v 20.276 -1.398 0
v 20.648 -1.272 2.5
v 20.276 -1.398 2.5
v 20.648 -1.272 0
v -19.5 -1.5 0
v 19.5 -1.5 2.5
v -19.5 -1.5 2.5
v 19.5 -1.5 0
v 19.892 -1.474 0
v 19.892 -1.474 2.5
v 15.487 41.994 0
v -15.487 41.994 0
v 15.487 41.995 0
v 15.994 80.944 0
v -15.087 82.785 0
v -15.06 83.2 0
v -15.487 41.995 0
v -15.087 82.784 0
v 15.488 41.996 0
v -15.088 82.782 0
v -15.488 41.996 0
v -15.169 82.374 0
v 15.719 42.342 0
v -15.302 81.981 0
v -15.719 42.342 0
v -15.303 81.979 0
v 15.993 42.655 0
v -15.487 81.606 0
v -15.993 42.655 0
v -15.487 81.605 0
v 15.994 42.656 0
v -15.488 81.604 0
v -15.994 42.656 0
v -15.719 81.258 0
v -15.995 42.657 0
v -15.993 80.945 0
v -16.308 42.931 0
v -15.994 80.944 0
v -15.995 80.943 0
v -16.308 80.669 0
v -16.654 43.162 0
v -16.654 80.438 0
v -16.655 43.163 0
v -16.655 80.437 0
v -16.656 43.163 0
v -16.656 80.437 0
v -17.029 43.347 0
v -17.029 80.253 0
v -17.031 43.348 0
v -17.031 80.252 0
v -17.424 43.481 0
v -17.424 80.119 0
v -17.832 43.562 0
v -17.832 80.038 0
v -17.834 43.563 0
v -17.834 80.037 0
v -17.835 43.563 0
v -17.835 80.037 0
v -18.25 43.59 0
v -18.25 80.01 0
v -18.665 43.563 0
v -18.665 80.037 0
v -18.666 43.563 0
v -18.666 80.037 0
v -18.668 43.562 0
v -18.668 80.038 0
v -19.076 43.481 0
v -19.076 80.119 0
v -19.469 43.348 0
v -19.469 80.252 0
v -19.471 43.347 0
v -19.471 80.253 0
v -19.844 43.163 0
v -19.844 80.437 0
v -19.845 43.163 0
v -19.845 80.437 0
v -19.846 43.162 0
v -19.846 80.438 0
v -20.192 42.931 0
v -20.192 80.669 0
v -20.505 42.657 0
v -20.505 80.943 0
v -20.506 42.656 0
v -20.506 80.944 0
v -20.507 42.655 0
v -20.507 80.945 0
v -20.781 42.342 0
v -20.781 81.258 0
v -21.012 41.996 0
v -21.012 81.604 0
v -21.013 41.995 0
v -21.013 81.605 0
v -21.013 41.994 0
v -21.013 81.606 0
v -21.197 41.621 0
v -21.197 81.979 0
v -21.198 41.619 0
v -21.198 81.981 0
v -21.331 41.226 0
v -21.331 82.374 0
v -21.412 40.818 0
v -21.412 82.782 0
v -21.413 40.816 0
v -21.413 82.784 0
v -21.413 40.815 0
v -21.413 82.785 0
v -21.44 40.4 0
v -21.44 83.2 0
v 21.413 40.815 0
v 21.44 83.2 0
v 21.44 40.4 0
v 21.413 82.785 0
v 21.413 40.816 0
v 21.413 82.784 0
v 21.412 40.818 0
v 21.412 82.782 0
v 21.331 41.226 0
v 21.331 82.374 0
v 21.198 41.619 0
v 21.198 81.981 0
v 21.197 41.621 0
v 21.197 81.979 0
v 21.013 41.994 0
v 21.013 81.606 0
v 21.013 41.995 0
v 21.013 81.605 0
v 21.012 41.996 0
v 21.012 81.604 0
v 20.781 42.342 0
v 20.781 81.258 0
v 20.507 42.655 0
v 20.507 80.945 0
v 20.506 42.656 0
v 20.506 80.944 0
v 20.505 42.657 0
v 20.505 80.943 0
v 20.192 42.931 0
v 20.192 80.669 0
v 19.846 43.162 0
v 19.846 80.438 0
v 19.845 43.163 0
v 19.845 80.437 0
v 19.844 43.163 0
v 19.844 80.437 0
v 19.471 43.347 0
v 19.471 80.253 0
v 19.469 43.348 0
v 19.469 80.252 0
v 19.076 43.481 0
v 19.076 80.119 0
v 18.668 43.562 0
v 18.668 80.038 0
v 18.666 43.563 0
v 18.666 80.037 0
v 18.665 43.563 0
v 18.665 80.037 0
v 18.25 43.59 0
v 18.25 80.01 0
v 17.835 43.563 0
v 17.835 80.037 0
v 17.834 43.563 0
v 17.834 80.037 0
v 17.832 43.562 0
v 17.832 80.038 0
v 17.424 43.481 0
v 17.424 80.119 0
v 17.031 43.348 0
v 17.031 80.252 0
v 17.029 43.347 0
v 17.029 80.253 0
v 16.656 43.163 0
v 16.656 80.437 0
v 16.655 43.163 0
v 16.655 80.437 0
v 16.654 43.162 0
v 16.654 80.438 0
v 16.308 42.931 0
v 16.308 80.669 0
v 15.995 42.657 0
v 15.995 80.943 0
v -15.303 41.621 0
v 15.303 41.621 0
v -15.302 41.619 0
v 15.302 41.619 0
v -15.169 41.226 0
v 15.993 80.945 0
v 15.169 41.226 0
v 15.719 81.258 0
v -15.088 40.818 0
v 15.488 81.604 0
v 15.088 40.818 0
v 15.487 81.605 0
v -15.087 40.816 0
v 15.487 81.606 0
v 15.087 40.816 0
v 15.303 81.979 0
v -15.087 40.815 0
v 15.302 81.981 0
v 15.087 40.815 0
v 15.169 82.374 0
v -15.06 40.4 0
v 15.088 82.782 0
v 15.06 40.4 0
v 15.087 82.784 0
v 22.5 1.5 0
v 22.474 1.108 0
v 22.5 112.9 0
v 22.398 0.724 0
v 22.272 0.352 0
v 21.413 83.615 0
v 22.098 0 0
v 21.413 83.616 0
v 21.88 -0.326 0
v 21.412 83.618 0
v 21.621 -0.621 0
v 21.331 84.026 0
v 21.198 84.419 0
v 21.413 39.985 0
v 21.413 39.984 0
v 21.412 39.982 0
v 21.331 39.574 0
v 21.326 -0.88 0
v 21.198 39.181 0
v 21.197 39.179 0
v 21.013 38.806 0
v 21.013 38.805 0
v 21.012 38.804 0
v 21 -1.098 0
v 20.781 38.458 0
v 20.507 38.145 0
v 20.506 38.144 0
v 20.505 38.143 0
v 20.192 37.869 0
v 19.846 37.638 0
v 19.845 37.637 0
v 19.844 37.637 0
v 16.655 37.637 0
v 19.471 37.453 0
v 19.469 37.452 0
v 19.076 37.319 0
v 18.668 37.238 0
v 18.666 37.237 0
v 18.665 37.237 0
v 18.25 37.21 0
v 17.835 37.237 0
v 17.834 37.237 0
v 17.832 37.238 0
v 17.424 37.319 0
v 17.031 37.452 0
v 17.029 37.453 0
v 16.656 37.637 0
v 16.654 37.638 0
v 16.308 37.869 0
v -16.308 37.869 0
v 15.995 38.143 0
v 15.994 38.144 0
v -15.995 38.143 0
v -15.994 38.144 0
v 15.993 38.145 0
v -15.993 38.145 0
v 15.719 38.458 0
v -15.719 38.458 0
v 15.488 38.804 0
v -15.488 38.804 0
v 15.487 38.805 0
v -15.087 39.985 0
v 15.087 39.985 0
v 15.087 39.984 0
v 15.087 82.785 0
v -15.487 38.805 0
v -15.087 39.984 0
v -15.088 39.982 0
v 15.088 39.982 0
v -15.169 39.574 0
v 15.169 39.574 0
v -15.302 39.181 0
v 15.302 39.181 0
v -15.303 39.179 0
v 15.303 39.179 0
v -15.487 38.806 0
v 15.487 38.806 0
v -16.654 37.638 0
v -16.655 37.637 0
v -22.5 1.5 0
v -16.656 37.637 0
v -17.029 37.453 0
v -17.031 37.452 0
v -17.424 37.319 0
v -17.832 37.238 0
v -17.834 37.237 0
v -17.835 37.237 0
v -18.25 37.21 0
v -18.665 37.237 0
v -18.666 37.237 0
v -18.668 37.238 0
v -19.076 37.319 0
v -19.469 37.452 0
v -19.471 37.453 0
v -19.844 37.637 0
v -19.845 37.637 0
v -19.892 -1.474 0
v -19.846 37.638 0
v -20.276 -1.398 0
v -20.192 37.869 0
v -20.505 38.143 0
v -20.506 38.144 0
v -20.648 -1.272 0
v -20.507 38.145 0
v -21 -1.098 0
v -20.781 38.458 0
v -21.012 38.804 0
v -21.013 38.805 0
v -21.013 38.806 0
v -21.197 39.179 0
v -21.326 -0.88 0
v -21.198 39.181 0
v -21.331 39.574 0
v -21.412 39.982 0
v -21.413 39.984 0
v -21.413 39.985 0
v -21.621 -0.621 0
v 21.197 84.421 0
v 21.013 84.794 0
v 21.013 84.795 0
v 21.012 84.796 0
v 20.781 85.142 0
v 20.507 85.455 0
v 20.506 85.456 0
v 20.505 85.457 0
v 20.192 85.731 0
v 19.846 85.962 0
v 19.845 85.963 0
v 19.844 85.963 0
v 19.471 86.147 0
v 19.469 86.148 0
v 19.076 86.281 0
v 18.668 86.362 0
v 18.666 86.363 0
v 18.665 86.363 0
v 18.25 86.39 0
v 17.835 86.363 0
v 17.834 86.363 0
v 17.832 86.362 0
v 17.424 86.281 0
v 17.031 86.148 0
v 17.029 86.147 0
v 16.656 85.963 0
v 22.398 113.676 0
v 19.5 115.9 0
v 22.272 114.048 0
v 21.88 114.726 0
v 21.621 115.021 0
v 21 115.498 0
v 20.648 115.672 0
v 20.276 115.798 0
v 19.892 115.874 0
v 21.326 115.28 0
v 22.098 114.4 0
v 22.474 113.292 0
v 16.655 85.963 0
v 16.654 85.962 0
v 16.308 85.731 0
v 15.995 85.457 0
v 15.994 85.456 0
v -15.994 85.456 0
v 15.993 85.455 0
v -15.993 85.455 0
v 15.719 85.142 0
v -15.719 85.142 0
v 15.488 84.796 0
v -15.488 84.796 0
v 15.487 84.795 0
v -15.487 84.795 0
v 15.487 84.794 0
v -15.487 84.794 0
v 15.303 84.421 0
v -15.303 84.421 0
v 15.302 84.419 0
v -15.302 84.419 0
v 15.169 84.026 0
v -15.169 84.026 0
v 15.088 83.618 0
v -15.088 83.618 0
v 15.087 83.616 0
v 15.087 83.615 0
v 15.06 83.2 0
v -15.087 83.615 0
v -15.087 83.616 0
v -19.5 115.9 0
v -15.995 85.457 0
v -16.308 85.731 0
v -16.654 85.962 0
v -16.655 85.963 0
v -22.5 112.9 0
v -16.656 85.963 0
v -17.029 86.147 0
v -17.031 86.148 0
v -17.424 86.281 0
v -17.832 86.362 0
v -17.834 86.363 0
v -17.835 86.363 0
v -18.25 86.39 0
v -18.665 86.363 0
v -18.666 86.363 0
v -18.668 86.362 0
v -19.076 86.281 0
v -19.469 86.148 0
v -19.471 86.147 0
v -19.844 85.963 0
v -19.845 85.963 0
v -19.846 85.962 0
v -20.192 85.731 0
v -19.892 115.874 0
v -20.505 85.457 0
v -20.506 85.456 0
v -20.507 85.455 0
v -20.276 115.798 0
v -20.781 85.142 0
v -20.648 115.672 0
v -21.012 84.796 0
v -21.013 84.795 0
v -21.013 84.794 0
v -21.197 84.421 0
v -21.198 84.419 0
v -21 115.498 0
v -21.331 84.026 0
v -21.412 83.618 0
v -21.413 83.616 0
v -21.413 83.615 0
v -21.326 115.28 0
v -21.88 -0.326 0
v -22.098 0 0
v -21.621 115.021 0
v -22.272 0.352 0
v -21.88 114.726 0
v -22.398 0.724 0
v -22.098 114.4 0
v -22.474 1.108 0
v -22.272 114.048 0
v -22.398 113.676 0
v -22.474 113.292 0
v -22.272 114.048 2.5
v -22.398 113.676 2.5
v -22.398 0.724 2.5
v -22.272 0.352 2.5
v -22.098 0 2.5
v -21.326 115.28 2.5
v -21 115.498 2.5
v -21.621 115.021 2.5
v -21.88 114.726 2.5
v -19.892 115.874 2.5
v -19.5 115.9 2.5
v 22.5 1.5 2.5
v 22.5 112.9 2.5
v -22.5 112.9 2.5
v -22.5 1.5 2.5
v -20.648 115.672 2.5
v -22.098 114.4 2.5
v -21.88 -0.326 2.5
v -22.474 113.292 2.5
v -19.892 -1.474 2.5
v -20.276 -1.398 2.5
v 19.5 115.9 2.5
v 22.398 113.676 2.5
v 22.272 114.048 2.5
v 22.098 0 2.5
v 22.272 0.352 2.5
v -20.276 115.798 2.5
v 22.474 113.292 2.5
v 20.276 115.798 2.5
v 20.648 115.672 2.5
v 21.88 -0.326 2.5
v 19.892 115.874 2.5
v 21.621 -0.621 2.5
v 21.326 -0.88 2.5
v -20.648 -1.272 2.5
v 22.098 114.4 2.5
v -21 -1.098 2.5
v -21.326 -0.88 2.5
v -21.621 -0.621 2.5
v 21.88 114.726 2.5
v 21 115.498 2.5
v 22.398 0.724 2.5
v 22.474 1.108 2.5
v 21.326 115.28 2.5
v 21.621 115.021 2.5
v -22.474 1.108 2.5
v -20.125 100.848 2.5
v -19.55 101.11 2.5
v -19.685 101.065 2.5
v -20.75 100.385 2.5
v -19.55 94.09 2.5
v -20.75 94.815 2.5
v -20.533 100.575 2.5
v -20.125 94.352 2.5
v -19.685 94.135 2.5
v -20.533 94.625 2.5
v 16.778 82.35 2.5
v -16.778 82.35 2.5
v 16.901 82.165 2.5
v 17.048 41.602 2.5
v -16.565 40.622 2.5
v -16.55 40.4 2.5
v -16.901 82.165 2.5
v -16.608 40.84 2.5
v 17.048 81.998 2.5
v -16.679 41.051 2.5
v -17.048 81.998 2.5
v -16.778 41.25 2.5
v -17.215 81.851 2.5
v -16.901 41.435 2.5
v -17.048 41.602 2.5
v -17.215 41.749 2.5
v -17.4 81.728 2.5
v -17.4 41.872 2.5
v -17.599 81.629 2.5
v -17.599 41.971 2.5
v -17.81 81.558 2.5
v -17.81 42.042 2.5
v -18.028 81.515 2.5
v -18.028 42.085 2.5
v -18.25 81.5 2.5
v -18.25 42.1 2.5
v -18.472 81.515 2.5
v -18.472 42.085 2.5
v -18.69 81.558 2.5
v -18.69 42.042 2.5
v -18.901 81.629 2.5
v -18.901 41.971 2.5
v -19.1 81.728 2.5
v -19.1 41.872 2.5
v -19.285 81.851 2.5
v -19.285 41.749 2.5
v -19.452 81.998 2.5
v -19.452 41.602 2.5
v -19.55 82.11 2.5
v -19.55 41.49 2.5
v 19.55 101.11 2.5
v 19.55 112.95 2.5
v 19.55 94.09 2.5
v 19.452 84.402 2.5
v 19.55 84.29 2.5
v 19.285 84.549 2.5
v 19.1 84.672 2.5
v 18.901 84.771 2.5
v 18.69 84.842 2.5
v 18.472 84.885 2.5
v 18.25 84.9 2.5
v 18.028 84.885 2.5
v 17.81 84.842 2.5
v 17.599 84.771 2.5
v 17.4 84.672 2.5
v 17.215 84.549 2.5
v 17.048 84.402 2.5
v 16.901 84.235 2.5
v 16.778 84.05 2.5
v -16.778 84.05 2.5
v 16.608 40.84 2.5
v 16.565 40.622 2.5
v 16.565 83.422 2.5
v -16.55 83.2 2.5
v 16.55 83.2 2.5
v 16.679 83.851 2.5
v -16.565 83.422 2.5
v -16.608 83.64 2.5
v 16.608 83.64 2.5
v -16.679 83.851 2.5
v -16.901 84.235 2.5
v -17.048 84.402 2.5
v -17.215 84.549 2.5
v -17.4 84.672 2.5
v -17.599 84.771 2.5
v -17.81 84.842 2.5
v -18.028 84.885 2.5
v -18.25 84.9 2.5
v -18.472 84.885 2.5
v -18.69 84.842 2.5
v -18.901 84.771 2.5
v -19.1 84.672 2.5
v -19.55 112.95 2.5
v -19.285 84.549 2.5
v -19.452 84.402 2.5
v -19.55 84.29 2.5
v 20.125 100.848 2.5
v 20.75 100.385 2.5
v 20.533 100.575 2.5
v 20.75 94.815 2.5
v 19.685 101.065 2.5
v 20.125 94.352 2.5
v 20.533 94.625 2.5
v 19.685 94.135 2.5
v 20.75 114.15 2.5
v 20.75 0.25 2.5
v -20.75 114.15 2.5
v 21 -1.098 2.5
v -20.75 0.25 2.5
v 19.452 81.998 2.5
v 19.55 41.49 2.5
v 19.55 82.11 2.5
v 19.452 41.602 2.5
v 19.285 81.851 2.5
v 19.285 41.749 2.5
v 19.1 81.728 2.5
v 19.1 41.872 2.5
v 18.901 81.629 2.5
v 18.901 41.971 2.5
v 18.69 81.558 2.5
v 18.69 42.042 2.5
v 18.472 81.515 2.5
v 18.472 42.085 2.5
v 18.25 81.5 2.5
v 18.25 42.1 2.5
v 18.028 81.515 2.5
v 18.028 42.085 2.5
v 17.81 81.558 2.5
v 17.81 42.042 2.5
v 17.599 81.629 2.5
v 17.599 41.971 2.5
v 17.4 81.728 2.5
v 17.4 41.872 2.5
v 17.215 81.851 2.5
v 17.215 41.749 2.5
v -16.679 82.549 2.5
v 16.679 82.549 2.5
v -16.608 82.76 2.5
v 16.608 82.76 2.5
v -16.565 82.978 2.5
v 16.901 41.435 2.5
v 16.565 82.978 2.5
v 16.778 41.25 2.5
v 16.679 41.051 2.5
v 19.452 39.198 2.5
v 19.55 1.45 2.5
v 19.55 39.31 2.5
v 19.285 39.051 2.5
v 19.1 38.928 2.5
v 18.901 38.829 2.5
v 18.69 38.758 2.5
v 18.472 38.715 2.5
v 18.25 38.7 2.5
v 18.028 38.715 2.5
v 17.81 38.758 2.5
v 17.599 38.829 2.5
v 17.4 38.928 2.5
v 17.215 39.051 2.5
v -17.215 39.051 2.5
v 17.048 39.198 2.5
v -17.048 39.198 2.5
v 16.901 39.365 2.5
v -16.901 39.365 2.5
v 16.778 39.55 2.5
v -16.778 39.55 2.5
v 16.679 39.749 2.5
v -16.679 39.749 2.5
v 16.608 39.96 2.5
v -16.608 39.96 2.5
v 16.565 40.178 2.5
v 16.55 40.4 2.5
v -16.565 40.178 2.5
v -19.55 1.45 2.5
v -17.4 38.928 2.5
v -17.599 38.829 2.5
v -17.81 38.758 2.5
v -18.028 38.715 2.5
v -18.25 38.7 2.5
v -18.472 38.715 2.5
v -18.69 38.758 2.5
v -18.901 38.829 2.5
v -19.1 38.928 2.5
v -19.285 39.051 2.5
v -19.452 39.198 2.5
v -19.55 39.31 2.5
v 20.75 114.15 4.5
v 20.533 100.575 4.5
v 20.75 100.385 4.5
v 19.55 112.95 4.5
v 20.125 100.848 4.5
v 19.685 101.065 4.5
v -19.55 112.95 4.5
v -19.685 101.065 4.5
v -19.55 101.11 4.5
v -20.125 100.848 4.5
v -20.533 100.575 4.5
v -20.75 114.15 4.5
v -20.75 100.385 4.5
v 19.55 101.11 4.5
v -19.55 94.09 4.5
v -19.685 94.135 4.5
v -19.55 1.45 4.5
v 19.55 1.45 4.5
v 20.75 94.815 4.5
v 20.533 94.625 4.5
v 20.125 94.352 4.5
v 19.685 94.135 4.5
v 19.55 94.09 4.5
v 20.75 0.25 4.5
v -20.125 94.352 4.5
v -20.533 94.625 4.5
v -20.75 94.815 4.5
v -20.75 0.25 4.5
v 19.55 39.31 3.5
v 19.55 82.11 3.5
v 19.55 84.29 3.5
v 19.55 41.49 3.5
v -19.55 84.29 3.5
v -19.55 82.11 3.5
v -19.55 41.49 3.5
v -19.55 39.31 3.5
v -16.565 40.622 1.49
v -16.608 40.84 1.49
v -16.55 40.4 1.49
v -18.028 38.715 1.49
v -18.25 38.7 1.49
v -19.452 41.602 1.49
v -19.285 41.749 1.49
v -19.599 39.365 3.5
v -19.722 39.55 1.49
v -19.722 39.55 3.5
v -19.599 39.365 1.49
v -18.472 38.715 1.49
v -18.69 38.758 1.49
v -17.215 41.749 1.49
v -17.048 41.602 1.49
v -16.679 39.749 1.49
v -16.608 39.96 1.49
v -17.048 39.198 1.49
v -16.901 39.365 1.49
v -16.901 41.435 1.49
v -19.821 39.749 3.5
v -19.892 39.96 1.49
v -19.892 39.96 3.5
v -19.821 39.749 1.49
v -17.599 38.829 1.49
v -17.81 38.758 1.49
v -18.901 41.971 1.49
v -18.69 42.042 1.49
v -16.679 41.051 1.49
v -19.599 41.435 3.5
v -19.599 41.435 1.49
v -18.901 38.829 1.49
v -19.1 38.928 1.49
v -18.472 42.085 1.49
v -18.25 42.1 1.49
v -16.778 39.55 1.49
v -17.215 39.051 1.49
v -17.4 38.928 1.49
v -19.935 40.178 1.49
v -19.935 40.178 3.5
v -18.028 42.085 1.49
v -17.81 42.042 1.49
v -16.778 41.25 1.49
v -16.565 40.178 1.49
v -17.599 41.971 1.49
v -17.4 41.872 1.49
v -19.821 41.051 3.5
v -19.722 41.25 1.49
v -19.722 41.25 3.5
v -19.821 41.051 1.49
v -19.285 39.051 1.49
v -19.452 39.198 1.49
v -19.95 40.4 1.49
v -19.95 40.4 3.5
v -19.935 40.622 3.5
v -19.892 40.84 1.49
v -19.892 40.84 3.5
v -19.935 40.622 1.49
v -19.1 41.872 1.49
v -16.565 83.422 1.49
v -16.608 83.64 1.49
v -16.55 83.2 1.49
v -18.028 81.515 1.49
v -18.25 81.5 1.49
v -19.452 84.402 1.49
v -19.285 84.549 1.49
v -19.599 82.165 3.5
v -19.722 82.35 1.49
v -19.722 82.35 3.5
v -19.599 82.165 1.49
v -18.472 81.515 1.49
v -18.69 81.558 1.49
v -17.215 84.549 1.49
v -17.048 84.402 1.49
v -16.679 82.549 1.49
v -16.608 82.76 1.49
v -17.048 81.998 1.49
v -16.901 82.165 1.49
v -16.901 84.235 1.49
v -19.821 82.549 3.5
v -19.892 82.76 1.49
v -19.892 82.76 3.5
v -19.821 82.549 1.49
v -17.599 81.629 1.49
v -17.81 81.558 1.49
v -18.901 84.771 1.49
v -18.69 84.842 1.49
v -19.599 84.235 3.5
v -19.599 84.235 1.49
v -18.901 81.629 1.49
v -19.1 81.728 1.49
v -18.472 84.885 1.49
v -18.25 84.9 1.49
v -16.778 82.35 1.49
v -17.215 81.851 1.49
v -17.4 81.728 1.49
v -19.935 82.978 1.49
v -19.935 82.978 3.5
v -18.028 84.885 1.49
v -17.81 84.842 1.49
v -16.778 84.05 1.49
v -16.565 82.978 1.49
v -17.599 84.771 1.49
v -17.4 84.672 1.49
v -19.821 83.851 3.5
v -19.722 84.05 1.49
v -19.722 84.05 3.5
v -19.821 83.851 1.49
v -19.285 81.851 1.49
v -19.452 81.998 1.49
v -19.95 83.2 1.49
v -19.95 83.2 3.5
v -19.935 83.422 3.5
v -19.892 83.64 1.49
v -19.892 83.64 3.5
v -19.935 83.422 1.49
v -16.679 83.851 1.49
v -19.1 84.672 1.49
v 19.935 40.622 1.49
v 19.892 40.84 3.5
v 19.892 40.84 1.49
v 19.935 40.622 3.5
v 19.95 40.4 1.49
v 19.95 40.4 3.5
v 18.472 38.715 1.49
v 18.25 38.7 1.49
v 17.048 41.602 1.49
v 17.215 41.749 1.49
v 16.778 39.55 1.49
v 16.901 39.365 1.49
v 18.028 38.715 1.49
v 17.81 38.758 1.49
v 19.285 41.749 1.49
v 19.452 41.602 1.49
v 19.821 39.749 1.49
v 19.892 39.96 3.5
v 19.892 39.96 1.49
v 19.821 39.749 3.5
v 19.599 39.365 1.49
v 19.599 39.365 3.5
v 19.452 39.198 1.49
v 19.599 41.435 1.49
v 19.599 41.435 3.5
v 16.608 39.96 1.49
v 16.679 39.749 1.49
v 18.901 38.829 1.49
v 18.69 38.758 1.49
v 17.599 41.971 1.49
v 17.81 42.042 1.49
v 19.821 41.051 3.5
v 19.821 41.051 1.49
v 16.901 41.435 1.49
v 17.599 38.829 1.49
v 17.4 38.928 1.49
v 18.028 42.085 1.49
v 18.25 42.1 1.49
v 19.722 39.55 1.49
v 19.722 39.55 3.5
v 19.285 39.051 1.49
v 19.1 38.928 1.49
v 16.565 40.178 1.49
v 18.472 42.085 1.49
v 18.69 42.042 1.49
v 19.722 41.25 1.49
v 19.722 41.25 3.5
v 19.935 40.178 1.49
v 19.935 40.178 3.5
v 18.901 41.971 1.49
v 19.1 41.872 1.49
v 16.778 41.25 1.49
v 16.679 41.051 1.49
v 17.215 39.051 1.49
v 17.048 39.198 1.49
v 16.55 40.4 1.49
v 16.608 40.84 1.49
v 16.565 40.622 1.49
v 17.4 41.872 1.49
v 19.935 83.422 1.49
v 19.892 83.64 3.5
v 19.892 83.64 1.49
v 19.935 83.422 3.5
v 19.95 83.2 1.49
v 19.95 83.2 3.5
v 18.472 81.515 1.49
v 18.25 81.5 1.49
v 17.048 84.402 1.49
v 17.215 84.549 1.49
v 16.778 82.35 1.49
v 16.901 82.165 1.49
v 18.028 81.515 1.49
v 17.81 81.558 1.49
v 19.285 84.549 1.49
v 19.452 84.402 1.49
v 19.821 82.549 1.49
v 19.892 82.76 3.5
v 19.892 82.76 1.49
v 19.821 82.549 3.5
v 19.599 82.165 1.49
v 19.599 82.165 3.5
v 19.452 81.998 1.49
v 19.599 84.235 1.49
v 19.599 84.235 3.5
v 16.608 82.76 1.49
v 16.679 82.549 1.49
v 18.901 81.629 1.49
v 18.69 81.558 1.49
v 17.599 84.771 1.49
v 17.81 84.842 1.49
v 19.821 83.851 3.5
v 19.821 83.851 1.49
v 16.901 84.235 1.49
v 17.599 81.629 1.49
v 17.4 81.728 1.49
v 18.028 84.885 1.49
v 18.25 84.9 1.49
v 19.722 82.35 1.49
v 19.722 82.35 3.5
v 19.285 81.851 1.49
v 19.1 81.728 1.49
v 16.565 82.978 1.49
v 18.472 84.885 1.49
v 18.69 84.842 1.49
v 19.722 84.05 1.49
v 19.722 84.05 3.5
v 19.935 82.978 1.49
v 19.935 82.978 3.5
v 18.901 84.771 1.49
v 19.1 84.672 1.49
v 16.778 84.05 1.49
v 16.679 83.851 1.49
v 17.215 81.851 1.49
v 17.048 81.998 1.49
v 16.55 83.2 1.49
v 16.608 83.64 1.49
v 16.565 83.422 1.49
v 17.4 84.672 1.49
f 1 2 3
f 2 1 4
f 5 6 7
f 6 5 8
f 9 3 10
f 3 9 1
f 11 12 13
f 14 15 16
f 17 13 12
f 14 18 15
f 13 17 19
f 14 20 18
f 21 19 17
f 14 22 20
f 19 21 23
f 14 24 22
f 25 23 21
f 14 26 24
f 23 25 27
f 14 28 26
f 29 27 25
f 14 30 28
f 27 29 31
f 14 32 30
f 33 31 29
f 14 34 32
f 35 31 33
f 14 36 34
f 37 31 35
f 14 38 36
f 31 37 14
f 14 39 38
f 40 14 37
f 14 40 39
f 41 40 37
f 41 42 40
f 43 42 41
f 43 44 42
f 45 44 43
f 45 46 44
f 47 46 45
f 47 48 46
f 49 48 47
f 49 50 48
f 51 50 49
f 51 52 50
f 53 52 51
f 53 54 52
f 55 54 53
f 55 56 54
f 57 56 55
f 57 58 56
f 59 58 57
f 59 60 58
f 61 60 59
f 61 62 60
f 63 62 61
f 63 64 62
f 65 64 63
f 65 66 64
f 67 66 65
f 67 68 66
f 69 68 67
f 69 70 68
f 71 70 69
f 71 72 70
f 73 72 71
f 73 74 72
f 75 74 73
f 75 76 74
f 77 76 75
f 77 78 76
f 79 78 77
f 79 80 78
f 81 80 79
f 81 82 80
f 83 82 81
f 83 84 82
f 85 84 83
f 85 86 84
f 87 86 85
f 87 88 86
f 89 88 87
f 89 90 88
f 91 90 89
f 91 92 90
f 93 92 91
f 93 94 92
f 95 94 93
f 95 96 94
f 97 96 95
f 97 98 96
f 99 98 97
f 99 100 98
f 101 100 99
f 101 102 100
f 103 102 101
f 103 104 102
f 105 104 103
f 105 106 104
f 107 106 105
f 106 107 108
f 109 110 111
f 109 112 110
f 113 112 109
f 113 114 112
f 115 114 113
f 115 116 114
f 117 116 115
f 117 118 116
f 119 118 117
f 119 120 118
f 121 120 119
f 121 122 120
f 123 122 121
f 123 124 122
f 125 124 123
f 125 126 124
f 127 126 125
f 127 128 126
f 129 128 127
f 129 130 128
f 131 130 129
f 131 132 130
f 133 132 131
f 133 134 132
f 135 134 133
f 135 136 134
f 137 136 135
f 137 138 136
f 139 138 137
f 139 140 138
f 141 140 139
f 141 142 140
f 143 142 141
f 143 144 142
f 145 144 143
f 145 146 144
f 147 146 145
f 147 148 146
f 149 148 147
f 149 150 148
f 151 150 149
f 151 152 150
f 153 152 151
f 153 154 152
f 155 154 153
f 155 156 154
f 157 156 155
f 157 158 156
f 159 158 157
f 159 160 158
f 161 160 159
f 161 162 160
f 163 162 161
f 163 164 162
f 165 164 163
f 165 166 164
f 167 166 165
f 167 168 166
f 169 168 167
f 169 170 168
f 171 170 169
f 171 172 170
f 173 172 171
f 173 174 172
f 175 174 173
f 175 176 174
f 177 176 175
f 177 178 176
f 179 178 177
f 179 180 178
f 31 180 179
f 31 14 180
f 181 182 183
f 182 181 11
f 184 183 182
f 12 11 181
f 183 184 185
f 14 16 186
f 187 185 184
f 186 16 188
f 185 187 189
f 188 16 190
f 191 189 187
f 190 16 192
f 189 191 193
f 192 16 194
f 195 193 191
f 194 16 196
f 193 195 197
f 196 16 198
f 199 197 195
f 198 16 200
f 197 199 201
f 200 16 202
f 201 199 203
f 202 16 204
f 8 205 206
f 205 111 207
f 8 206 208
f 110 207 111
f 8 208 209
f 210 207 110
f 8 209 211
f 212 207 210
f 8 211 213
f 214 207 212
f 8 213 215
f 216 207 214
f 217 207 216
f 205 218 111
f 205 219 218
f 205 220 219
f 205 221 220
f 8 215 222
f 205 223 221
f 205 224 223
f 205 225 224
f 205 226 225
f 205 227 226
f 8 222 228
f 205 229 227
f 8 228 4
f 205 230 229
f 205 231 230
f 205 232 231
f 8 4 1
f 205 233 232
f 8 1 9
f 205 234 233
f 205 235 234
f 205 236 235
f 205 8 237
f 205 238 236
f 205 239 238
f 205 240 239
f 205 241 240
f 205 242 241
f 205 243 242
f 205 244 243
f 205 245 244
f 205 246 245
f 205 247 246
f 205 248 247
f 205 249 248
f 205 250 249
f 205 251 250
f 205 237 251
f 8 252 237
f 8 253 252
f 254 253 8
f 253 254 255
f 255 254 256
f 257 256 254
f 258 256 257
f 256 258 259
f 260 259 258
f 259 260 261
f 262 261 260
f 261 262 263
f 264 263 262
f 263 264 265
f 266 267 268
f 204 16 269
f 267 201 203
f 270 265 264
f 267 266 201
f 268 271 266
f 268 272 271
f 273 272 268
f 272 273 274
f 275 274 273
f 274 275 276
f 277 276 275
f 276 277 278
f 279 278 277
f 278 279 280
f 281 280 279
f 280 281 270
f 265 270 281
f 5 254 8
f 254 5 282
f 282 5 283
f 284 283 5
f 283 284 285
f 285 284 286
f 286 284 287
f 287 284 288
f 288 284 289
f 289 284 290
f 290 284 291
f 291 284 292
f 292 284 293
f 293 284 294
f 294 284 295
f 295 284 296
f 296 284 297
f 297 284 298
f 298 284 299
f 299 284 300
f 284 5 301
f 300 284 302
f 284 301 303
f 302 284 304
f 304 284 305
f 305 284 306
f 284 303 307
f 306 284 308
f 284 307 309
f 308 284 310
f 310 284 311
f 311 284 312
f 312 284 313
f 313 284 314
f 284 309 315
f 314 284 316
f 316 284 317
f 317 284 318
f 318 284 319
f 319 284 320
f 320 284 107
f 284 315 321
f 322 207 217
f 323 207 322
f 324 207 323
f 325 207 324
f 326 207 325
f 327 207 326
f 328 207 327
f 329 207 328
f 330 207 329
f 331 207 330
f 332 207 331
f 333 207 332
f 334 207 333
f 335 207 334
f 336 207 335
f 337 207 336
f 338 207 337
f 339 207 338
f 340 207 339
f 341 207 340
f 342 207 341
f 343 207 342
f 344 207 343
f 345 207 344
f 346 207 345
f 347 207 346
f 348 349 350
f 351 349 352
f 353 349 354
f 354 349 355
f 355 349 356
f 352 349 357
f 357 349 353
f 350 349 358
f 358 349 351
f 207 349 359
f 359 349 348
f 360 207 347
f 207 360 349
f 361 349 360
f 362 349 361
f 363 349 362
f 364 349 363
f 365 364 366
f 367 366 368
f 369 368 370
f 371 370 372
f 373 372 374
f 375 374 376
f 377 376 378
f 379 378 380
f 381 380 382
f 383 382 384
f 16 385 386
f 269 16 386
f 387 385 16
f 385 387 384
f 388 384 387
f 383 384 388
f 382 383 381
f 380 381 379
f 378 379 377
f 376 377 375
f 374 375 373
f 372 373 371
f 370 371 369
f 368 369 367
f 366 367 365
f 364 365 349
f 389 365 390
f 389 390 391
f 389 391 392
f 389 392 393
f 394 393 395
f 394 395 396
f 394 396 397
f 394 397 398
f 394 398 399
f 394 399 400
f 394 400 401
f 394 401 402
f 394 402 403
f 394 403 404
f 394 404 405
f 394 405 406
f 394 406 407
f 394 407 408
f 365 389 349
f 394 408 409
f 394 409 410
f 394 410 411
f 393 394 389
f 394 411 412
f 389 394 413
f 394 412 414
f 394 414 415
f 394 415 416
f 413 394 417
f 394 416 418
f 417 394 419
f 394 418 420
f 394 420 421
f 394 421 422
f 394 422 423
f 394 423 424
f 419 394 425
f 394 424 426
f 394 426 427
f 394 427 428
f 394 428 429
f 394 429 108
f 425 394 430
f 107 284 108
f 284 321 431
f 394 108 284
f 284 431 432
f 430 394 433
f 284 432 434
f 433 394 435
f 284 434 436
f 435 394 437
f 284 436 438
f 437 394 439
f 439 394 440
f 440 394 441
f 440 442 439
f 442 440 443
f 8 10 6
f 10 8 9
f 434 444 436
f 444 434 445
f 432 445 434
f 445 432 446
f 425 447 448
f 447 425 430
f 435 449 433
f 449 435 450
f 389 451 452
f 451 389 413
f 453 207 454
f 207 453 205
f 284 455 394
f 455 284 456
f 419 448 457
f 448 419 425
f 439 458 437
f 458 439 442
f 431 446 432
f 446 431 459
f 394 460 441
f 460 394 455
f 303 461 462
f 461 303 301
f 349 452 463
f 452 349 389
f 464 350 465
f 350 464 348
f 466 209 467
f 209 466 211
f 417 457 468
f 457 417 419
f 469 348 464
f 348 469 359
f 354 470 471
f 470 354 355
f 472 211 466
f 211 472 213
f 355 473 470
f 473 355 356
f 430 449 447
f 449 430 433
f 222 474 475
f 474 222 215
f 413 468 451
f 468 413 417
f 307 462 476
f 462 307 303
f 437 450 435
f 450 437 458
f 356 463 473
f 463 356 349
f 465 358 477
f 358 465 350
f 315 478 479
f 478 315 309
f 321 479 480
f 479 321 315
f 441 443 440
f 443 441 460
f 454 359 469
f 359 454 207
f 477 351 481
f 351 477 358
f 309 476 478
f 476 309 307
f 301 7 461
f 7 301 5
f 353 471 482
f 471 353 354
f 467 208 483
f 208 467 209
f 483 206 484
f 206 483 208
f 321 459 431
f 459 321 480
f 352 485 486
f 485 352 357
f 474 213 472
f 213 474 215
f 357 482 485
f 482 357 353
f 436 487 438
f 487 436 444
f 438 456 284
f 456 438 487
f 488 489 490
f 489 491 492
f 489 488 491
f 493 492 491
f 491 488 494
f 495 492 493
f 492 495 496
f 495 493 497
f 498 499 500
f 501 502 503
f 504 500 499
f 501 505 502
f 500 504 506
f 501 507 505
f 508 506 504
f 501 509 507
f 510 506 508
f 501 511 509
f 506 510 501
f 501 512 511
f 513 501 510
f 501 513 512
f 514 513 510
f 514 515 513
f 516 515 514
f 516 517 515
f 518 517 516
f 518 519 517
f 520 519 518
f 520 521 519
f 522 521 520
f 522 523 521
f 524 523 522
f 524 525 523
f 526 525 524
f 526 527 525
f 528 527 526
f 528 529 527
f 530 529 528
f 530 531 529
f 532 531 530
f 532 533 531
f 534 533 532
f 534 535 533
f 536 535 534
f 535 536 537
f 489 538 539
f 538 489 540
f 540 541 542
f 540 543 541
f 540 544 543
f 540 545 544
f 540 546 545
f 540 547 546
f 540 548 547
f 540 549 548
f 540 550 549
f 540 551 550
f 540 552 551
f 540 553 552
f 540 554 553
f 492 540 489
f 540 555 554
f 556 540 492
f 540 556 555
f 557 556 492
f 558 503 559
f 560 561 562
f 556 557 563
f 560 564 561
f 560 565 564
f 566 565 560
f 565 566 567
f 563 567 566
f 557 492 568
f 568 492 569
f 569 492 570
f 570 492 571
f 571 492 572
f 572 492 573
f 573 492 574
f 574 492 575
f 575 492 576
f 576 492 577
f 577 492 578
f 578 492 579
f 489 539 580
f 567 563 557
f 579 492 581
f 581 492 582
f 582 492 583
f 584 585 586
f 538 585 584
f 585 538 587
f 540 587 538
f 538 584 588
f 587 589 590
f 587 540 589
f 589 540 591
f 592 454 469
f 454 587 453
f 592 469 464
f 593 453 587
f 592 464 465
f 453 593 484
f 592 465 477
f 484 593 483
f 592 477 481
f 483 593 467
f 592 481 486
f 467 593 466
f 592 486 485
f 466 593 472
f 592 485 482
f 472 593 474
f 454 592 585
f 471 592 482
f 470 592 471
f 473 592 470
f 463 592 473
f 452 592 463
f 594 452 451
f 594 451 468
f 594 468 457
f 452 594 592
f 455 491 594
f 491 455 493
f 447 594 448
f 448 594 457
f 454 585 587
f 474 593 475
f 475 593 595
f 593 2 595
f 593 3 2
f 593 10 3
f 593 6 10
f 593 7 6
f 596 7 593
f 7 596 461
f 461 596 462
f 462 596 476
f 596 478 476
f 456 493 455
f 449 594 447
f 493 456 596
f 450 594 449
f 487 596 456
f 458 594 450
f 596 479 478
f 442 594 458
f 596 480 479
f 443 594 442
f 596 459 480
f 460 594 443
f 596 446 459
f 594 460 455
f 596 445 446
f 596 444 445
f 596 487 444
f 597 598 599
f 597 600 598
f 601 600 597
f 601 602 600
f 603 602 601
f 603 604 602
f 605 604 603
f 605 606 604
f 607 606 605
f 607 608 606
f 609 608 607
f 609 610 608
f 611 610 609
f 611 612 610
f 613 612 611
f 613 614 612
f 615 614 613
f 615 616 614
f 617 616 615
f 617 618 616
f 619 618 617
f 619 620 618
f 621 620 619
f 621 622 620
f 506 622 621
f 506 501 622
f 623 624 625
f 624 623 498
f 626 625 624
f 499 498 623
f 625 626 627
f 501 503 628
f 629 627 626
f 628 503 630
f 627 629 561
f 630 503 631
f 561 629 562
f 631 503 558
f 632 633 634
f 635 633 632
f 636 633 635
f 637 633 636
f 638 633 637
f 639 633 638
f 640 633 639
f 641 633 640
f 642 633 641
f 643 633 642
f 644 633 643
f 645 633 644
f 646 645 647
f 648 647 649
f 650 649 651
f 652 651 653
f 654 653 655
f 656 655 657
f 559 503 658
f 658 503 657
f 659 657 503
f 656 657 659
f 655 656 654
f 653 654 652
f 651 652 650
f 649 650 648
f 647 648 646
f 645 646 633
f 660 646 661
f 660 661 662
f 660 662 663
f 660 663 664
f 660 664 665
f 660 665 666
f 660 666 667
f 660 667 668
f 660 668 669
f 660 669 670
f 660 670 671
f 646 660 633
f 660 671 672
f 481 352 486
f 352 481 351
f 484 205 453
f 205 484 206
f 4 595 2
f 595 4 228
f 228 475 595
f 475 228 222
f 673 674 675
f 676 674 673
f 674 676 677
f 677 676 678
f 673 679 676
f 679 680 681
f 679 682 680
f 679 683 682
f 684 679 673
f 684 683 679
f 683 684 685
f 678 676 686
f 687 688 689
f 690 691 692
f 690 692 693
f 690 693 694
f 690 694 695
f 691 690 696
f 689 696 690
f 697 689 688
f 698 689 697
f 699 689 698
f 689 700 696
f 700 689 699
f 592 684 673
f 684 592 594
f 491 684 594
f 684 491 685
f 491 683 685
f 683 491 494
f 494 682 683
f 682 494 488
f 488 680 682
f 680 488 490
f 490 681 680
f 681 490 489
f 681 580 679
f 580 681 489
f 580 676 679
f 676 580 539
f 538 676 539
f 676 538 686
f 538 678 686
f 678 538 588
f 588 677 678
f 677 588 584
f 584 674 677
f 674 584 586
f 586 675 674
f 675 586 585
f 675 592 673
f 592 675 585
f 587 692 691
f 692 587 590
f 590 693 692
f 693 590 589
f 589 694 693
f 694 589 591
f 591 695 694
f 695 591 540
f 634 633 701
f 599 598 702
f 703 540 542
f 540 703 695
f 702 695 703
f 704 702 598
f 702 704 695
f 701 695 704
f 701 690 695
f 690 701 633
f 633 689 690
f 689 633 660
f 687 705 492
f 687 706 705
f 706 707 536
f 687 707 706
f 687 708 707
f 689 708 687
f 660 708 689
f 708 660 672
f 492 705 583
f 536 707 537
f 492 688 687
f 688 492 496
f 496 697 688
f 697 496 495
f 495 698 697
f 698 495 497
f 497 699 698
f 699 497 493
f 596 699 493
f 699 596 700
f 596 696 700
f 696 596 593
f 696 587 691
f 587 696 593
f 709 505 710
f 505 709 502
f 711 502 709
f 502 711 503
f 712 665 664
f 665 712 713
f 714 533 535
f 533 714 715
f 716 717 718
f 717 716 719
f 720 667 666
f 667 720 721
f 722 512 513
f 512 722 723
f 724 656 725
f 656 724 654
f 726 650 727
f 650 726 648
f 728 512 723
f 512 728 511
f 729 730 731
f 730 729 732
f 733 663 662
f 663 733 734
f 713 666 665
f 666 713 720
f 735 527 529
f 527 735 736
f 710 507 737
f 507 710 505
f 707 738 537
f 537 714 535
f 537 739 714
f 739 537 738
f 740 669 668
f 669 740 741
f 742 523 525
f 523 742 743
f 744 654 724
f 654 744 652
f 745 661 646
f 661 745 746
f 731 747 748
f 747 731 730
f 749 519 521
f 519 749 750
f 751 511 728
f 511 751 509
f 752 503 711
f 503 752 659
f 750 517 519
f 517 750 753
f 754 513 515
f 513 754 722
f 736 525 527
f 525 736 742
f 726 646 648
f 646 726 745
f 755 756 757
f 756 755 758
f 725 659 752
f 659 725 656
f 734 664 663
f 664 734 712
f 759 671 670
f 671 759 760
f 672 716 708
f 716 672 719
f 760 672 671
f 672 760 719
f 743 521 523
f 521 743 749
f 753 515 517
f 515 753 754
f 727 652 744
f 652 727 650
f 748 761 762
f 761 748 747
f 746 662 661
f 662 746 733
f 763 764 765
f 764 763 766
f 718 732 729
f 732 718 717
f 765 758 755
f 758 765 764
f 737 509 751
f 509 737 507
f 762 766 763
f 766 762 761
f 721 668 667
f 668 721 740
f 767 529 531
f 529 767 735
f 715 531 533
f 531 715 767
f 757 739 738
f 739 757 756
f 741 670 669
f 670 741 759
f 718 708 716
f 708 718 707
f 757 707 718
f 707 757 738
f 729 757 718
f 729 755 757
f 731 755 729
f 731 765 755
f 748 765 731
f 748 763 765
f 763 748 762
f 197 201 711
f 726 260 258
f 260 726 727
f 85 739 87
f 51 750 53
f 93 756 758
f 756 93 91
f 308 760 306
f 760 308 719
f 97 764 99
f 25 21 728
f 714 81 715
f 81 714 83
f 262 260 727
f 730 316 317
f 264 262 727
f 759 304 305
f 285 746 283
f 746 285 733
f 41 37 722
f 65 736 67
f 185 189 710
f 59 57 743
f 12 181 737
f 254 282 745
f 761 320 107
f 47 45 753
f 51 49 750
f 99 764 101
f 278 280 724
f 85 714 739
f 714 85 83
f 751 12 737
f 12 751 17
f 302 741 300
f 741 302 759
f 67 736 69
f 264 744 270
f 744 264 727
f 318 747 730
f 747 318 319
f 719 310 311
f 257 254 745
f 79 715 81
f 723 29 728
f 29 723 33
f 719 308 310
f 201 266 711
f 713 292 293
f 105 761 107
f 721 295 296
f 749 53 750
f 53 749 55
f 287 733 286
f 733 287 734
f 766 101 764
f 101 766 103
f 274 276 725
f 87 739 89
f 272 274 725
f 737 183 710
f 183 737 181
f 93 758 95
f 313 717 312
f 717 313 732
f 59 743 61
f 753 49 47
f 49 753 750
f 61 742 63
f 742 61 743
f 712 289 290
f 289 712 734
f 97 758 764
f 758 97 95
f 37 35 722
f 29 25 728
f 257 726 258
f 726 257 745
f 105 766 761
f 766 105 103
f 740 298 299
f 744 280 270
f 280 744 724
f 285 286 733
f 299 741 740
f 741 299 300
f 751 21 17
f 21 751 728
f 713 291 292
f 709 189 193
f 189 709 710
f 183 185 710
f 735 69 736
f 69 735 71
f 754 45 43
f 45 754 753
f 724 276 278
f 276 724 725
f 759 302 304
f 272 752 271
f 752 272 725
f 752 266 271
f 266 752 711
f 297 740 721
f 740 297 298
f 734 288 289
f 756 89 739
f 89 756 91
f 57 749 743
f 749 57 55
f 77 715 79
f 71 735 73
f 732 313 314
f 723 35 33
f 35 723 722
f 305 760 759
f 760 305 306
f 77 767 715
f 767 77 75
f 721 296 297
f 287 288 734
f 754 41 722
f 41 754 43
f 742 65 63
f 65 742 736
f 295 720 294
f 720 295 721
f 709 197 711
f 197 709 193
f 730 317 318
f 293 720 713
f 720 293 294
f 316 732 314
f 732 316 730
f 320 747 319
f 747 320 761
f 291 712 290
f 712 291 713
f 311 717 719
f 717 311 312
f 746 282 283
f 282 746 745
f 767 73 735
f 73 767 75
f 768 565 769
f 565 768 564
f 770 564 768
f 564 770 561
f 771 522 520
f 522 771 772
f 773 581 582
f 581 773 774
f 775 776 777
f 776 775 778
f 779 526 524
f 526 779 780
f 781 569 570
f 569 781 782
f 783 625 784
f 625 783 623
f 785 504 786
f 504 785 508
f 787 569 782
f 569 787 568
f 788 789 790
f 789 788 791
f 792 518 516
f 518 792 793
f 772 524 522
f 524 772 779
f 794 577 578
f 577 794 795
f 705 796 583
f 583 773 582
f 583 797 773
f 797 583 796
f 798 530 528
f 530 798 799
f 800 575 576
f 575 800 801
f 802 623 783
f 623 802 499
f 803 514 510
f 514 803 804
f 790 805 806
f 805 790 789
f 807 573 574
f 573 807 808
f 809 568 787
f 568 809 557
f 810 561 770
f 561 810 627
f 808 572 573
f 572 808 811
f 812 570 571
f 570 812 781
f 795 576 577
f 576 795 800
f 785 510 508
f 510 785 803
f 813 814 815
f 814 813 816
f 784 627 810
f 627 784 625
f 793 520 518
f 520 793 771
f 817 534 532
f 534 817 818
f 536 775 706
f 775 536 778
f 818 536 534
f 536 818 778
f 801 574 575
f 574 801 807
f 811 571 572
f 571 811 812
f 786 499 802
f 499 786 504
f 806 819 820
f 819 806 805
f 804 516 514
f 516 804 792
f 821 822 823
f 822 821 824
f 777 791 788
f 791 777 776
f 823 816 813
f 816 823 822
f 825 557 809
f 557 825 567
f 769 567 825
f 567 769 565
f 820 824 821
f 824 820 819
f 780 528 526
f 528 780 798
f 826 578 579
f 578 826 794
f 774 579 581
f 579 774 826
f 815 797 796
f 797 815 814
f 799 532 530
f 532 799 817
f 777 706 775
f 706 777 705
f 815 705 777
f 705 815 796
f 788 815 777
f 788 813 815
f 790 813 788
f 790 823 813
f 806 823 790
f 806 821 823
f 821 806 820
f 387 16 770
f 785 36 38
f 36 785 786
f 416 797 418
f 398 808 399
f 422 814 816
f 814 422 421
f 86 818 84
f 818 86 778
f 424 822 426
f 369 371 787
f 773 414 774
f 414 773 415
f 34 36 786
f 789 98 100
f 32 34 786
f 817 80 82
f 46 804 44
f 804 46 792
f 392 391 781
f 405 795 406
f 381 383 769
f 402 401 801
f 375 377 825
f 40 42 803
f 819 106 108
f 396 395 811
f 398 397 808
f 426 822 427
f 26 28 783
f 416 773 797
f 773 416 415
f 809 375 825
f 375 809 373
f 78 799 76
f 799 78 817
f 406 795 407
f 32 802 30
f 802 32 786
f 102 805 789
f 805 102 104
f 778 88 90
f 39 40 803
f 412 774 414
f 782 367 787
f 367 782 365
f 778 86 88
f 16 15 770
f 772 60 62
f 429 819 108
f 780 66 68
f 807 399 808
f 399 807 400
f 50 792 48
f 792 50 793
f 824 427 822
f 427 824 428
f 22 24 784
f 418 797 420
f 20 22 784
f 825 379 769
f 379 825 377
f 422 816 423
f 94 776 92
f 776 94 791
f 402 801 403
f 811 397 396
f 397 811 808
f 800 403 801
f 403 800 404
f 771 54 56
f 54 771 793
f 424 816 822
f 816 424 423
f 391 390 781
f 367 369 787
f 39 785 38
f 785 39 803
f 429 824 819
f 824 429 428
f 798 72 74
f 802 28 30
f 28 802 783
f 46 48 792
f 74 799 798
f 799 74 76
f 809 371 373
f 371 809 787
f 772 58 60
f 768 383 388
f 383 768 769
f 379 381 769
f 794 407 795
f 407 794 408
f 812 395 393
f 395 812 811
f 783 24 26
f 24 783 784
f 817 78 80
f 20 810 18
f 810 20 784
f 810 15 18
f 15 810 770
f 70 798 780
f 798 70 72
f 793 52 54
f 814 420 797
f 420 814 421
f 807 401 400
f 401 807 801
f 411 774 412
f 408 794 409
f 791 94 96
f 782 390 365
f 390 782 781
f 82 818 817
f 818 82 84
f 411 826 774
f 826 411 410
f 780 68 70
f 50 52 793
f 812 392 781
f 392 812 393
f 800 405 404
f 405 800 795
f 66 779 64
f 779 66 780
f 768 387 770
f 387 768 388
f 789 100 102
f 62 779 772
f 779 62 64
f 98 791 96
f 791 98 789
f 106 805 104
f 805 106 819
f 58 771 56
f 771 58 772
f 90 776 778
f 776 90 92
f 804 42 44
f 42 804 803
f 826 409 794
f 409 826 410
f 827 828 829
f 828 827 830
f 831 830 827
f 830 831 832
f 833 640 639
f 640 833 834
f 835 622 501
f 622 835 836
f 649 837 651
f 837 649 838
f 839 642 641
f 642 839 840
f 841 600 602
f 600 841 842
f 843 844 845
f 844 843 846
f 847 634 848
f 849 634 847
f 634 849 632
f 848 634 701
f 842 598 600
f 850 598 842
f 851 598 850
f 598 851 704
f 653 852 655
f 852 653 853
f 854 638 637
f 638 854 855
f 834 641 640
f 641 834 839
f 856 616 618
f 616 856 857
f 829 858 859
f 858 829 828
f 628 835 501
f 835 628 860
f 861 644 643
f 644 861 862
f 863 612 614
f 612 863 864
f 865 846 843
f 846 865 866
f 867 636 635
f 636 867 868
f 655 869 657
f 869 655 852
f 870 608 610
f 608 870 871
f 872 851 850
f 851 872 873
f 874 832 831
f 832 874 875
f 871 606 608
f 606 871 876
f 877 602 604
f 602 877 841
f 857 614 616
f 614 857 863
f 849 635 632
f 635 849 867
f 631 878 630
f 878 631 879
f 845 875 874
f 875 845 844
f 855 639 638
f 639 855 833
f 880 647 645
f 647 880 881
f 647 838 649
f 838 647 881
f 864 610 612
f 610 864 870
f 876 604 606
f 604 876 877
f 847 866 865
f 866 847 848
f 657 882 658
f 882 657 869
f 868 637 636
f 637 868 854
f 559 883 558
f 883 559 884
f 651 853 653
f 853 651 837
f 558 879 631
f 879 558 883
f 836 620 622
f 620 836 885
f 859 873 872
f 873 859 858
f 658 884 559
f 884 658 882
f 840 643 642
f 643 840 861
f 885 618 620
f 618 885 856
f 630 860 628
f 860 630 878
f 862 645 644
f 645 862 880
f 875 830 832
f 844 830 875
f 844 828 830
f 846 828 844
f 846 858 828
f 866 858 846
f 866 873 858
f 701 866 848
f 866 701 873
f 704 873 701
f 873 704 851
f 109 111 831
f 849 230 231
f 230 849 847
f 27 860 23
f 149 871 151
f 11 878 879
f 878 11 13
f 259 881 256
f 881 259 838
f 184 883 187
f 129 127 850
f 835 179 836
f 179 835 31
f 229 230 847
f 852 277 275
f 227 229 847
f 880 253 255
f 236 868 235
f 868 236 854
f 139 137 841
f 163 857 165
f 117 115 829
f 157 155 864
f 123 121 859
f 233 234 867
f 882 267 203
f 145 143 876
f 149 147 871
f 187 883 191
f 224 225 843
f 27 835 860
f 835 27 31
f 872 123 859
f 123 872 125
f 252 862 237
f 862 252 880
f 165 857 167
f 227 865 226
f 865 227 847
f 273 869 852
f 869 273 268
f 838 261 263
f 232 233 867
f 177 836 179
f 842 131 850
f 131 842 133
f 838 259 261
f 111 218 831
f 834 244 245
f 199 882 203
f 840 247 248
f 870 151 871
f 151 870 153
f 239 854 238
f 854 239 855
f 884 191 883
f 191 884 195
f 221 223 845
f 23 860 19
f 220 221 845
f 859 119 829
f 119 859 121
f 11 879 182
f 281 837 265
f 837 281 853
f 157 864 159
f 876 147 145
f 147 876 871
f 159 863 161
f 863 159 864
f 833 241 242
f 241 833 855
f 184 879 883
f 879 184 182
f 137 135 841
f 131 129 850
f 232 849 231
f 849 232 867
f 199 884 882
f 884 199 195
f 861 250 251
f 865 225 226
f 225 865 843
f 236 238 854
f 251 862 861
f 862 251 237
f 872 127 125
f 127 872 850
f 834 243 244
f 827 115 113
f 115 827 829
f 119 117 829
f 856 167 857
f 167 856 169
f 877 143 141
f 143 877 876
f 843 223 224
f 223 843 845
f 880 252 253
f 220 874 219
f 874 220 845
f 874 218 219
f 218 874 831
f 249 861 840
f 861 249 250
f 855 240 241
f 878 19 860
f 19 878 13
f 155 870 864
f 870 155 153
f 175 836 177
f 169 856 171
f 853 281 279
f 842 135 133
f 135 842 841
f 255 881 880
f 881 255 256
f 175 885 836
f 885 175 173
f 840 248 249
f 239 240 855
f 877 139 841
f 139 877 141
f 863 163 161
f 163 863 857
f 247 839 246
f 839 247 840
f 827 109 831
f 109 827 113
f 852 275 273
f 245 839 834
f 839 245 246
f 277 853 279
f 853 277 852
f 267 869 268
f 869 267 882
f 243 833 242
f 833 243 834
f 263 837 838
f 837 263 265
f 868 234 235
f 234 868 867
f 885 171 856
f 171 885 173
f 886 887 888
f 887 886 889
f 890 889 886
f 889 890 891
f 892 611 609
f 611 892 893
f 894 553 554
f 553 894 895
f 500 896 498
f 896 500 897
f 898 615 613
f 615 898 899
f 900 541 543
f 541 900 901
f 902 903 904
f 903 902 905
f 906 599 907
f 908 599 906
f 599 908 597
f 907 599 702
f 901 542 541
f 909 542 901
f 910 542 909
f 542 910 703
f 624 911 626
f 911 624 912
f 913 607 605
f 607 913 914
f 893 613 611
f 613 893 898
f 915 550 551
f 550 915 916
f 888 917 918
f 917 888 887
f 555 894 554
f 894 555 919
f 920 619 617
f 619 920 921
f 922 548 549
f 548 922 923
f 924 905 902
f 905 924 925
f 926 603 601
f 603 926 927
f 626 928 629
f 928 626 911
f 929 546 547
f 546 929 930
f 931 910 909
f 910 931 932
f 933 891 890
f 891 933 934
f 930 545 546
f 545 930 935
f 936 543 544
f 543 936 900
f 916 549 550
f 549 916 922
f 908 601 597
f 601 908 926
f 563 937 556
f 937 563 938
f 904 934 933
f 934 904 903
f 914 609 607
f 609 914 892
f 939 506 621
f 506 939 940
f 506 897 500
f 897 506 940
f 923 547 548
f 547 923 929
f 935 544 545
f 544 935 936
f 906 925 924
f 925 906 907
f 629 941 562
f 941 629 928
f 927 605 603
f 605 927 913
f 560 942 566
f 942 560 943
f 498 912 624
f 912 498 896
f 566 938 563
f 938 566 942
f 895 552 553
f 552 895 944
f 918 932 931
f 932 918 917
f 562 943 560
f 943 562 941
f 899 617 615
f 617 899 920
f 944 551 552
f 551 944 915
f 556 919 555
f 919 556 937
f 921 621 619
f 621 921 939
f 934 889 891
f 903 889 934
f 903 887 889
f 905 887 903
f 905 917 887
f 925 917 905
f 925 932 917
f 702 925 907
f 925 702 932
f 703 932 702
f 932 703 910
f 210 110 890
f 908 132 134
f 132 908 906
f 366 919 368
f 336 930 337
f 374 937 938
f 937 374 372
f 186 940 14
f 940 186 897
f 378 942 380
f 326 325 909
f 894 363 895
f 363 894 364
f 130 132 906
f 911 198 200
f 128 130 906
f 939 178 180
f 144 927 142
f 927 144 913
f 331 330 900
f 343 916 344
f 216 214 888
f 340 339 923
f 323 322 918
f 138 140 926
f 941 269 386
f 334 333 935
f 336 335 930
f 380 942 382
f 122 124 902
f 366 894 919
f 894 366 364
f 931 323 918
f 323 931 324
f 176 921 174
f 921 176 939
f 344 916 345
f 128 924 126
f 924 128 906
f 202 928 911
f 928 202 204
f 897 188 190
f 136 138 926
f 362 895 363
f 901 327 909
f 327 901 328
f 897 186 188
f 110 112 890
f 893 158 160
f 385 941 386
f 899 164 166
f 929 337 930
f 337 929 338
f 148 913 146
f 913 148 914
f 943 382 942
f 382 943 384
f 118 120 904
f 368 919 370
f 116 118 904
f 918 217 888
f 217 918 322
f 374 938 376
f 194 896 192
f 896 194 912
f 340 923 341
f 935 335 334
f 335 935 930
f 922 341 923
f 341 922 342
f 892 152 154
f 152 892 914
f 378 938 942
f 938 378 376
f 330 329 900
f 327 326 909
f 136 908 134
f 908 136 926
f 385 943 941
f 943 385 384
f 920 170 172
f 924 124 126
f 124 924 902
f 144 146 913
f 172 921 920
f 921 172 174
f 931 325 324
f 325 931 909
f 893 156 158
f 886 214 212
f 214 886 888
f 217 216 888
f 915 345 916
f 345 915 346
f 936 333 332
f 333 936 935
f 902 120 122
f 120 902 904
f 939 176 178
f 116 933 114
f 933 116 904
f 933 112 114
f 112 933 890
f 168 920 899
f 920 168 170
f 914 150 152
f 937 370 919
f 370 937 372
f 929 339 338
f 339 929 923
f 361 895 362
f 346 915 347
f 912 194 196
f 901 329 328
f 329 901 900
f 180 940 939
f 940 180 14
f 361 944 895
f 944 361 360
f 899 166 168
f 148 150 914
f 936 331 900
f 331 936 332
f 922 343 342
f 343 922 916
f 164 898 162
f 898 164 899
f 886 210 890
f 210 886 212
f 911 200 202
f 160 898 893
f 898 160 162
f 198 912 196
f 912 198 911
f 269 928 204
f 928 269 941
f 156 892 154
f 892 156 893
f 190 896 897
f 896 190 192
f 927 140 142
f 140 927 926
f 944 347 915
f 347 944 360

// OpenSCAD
// Back cover: built from model.scad as its own part.
include <model.scad>
view = "cover";
